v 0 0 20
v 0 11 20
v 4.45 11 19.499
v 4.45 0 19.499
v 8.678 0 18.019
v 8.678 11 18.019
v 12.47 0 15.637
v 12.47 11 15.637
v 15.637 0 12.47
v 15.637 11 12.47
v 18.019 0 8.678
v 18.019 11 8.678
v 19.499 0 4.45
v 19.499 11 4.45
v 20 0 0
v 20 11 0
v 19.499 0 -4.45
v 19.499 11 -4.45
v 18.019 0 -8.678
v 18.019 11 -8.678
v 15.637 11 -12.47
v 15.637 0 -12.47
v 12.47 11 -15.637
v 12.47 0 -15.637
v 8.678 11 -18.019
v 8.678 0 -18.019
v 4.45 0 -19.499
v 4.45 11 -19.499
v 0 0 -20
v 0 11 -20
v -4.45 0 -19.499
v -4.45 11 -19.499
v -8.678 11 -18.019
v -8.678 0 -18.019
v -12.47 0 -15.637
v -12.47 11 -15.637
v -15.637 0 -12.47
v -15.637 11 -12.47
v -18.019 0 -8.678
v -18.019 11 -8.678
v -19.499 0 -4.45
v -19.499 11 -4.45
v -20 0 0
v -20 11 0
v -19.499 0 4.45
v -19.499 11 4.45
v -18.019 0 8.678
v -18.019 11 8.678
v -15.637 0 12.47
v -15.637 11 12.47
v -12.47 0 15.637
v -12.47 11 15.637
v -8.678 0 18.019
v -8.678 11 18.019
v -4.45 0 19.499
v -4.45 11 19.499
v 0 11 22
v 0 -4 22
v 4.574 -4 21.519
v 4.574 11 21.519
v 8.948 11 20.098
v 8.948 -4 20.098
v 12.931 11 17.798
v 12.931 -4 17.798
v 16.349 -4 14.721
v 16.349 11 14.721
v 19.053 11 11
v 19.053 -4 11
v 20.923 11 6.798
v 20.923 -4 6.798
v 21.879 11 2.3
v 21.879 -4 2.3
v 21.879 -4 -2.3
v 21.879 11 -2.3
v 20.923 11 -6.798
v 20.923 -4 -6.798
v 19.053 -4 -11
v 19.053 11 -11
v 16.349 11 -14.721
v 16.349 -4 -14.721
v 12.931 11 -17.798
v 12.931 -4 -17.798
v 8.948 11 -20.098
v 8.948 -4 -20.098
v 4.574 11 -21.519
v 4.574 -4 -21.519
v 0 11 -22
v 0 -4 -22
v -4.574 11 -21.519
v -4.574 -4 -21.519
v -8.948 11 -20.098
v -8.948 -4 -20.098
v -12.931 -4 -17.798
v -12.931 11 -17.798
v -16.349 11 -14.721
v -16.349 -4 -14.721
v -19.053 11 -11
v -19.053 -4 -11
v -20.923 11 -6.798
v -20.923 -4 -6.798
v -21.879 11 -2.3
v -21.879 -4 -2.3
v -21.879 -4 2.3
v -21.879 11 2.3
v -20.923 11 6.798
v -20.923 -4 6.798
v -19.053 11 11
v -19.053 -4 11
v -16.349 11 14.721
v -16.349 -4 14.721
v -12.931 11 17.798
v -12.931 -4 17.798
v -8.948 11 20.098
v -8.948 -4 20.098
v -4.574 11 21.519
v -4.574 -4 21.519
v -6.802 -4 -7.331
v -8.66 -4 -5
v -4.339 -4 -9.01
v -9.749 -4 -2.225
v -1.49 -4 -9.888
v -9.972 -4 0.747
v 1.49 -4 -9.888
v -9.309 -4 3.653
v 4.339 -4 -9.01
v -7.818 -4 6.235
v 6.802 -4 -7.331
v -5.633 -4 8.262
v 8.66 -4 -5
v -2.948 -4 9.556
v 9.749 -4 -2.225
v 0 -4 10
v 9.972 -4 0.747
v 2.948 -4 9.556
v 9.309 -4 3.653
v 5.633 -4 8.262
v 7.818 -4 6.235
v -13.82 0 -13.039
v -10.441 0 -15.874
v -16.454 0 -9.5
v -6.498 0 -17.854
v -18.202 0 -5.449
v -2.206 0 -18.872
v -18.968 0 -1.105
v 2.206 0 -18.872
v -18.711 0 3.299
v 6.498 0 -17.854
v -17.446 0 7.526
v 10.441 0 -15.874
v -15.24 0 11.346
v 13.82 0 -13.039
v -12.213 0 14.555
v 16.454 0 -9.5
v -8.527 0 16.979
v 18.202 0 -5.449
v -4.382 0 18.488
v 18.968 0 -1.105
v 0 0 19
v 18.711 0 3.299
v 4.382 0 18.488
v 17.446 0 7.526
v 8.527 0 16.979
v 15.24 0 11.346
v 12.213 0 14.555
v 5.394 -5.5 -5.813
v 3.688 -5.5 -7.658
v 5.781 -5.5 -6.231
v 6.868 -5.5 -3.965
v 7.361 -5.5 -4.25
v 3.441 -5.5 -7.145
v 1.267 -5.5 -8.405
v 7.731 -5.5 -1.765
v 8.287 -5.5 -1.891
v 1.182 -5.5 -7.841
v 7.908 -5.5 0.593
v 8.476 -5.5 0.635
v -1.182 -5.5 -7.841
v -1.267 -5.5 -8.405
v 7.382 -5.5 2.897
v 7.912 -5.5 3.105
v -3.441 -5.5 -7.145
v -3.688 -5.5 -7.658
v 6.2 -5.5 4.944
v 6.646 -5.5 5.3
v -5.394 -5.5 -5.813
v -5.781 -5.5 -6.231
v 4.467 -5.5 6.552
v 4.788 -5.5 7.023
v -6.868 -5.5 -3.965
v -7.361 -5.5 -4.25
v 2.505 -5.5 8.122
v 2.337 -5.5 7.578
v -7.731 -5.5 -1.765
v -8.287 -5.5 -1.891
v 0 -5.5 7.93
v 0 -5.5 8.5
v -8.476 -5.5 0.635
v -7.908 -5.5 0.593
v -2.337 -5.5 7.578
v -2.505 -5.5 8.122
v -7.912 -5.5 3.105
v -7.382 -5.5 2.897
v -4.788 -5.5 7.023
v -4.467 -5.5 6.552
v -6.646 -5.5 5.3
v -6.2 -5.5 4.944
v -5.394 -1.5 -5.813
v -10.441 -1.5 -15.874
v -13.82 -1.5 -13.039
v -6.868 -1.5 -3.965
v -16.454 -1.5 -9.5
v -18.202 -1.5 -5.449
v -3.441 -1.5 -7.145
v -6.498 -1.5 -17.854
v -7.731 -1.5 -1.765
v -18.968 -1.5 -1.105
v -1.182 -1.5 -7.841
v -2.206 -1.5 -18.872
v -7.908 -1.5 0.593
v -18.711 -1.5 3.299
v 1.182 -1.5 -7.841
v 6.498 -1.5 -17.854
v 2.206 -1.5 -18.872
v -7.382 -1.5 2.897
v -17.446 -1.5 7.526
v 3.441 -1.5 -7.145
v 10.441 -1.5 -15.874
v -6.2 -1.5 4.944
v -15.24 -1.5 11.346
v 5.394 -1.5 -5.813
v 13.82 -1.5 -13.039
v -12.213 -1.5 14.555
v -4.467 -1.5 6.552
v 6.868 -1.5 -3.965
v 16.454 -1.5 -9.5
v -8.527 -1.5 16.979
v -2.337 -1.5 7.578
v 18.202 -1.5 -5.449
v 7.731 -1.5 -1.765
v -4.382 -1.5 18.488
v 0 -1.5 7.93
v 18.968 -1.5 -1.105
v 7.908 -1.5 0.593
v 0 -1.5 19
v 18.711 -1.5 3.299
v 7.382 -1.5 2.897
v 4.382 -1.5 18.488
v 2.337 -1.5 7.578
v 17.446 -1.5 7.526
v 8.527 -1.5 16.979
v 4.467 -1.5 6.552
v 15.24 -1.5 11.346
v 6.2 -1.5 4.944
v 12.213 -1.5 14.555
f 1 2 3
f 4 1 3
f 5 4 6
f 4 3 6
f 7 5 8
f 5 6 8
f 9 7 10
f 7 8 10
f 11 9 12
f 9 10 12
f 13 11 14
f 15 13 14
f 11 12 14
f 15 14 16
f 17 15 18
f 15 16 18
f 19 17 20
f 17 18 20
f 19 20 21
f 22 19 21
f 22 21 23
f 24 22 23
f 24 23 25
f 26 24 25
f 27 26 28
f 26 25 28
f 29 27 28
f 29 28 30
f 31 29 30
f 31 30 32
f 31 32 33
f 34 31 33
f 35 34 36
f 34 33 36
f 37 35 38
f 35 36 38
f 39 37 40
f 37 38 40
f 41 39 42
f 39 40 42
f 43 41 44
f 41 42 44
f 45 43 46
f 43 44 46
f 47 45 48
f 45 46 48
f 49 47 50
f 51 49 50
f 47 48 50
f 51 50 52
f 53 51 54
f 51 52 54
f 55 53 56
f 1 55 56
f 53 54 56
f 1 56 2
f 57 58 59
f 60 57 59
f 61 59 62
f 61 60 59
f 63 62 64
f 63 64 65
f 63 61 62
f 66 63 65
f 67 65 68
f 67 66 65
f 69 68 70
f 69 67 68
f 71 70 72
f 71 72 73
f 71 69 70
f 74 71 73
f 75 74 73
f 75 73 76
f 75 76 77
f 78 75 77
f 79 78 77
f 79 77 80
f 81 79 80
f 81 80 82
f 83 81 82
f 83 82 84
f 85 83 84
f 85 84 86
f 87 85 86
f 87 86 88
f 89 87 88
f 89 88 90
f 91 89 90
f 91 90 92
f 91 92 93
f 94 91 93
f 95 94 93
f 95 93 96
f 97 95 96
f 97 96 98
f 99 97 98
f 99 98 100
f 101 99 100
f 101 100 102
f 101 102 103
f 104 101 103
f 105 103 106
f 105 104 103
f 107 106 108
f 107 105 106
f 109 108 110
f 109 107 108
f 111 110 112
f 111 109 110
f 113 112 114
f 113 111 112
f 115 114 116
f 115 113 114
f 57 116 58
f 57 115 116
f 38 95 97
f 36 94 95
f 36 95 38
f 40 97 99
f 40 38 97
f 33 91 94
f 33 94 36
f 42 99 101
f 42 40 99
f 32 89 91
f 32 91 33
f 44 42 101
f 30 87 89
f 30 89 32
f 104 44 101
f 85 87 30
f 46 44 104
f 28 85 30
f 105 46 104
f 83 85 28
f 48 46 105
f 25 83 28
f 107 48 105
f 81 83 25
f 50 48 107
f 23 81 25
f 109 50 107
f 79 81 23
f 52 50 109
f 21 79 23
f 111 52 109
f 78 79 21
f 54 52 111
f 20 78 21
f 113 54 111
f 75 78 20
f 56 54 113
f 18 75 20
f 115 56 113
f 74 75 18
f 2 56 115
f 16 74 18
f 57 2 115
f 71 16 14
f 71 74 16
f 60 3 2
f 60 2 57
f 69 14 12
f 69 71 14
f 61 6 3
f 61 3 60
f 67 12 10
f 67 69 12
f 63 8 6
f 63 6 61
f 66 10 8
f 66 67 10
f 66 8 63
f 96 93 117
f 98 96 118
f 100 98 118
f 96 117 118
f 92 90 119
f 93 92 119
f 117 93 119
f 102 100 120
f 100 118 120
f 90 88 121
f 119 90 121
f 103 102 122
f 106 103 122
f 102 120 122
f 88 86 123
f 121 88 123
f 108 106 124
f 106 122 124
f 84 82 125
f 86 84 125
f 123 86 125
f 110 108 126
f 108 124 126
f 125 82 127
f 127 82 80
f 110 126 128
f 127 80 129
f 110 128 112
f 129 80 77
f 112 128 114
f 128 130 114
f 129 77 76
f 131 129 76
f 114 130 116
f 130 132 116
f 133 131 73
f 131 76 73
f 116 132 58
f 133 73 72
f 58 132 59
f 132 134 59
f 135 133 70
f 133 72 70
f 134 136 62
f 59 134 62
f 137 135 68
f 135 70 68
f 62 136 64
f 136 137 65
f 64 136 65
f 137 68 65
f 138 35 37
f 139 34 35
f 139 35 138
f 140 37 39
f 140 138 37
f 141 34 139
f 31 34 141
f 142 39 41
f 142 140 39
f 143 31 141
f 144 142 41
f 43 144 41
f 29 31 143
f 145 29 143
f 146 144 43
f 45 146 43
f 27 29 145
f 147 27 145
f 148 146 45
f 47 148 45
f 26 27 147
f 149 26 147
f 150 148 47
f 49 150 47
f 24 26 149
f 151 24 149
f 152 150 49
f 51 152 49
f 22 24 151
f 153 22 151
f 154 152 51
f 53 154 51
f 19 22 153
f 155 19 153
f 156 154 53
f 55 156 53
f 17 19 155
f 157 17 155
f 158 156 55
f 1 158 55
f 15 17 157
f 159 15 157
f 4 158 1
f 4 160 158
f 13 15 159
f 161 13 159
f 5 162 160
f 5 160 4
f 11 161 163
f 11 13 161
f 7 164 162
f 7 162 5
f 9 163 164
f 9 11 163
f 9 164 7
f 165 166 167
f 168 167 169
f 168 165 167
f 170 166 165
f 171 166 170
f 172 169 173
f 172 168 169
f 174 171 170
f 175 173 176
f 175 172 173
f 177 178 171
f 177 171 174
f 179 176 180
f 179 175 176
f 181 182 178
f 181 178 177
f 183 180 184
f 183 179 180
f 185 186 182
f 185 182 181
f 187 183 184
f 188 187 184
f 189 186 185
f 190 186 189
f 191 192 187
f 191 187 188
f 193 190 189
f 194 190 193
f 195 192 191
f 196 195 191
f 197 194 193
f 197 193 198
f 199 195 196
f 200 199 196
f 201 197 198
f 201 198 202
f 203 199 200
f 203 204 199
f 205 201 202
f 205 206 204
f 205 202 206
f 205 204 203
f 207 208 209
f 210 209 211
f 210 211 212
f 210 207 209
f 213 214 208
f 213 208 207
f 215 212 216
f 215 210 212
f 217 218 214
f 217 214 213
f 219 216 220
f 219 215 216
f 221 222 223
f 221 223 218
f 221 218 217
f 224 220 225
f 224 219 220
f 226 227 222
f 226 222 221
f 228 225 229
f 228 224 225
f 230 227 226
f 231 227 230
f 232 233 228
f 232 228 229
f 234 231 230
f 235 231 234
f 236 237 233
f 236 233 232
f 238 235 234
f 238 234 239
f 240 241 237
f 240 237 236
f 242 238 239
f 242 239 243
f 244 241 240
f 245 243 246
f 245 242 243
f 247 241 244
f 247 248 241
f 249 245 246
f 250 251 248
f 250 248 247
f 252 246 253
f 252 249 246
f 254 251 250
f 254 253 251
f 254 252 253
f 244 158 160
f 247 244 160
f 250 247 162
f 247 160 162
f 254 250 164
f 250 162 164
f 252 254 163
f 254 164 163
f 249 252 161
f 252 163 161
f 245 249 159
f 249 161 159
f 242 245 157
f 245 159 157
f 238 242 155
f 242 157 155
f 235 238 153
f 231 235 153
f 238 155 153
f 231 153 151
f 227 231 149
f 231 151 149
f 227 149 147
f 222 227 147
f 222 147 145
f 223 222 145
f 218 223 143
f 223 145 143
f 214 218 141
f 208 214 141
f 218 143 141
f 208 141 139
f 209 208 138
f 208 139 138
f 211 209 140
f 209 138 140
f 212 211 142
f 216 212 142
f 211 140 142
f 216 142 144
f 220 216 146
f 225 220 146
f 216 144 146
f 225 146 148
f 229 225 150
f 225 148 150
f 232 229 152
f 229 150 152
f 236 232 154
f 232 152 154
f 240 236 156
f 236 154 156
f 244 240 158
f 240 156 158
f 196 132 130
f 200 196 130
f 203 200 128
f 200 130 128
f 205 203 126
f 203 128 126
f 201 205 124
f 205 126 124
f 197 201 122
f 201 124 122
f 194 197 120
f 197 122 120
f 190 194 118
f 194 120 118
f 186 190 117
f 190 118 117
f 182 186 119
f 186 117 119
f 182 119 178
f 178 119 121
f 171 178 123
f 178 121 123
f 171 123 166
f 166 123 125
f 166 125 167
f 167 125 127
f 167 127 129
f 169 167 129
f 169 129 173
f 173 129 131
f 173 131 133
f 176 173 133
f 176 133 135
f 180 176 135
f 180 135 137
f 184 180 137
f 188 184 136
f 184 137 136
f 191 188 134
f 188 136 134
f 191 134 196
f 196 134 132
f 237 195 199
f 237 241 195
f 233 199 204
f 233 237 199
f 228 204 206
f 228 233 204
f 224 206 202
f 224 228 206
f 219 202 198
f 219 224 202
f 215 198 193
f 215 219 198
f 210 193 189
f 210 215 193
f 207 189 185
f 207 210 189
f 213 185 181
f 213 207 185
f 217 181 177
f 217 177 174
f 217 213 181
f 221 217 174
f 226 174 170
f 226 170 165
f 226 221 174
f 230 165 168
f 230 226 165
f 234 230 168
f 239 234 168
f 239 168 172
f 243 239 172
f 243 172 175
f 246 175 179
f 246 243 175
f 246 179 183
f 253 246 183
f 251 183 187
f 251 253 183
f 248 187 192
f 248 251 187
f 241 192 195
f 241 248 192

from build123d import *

# Parameters (mm, degrees)
SKETCH1_R           = 22
SKETCH1_R_2         = 7.93
BOSS_EXTRUDE1_DEPTH = 4
BOSS_EXTRUDE2_START = 11
SKETCH1_3_R         = 22
SKETCH1_3_R_2       = 20
BOSS_EXTRUDE2_DEPTH = 11
SKETCH1_4_R         = 19
CUT_EXTRUDE1_DEPTH  = 1.5
SKETCH3_R           = 11
SKETCH3_R_2         = 7.93
BOSS_EXTRUDE3_DEPTH = 1.5
CHAMFER1_SIZE       = 2.5


with BuildPart() as part:
    # Sketch1 → Boss-Extrude1 (new body)
    with BuildSketch(Plane(origin=(0, 0, 0), x_dir=(1, 0, 0), z_dir=(0, 1, 0))):
        with Locations(Location((0, 0, 0), (0, 0, 270))):
            Circle(SKETCH1_R)
        with Locations(Location((0, 0, 0), (0, 0, 270))):
            Circle(SKETCH1_R_2, mode=Mode.SUBTRACT)
    extrude(amount=-BOSS_EXTRUDE1_DEPTH)

    # Sketch1<3> → Boss-Extrude2 (add)
    with BuildSketch(Plane(origin=(0, 0, 0), x_dir=(1, 0, 0), z_dir=(0, 1, 0)).offset(BOSS_EXTRUDE2_START)):
        with Locations(Location((0, 0, 0), (0, 0, 270))):
            Circle(SKETCH1_3_R)
        with Locations(Location((0, 0, 0), (0, 0, 270))):
            Circle(SKETCH1_3_R_2, mode=Mode.SUBTRACT)
    extrude(amount=-BOSS_EXTRUDE2_DEPTH)

    # Sketch1<4> → Cut-Extrude1 (cut)
    with BuildSketch(Plane(origin=(0, 0, 0), x_dir=(1, 0, 0), z_dir=(0, 1, 0))):
        with Locations(Location((0, 0, 0), (0, 0, 270))):
            Circle(SKETCH1_4_R)
    extrude(amount=-CUT_EXTRUDE1_DEPTH, mode=Mode.SUBTRACT)

    # Sketch3 → Boss-Extrude3 (add)
    with BuildSketch(Plane.XZ.offset(4)):
        with Locations(Location((0, 0, 0), (0, 0, 90))):
            Circle(SKETCH3_R)
        with Locations(Location((0, 0, 0), (0, 0, 90))):
            Circle(SKETCH3_R_2, mode=Mode.SUBTRACT)
    extrude(amount=BOSS_EXTRUDE3_DEPTH)

    # Chamfer1
    # the kernel refuses this chamfer: 2.5 mm, written as the material it takes off along each edge
    with BuildSketch(Plane(origin=(0, -5.5, 0), x_dir=(0, 0, 1), z_dir=(1, 0, 0))) as chamfer1_piece_1_section:
        Polygon((11 - CHAMFER1_SIZE, 0), (11, -CHAMFER1_SIZE), (11, 0), align=None)
    chamfer1_piece_1 = revolve(axis=Axis((0, -5.5, 0), (0, -1, 0)), mode=Mode.PRIVATE)
    chamfer1_piece_1 = split(chamfer1_piece_1, bisect_by=Plane(origin=(0, -4, -9.254586784), z_dir=(0, -1, 0)), keep=Keep.TOP, mode=Mode.PRIVATE)
    add(chamfer1_piece_1, mode=Mode.SUBTRACT)


solid = part.part
